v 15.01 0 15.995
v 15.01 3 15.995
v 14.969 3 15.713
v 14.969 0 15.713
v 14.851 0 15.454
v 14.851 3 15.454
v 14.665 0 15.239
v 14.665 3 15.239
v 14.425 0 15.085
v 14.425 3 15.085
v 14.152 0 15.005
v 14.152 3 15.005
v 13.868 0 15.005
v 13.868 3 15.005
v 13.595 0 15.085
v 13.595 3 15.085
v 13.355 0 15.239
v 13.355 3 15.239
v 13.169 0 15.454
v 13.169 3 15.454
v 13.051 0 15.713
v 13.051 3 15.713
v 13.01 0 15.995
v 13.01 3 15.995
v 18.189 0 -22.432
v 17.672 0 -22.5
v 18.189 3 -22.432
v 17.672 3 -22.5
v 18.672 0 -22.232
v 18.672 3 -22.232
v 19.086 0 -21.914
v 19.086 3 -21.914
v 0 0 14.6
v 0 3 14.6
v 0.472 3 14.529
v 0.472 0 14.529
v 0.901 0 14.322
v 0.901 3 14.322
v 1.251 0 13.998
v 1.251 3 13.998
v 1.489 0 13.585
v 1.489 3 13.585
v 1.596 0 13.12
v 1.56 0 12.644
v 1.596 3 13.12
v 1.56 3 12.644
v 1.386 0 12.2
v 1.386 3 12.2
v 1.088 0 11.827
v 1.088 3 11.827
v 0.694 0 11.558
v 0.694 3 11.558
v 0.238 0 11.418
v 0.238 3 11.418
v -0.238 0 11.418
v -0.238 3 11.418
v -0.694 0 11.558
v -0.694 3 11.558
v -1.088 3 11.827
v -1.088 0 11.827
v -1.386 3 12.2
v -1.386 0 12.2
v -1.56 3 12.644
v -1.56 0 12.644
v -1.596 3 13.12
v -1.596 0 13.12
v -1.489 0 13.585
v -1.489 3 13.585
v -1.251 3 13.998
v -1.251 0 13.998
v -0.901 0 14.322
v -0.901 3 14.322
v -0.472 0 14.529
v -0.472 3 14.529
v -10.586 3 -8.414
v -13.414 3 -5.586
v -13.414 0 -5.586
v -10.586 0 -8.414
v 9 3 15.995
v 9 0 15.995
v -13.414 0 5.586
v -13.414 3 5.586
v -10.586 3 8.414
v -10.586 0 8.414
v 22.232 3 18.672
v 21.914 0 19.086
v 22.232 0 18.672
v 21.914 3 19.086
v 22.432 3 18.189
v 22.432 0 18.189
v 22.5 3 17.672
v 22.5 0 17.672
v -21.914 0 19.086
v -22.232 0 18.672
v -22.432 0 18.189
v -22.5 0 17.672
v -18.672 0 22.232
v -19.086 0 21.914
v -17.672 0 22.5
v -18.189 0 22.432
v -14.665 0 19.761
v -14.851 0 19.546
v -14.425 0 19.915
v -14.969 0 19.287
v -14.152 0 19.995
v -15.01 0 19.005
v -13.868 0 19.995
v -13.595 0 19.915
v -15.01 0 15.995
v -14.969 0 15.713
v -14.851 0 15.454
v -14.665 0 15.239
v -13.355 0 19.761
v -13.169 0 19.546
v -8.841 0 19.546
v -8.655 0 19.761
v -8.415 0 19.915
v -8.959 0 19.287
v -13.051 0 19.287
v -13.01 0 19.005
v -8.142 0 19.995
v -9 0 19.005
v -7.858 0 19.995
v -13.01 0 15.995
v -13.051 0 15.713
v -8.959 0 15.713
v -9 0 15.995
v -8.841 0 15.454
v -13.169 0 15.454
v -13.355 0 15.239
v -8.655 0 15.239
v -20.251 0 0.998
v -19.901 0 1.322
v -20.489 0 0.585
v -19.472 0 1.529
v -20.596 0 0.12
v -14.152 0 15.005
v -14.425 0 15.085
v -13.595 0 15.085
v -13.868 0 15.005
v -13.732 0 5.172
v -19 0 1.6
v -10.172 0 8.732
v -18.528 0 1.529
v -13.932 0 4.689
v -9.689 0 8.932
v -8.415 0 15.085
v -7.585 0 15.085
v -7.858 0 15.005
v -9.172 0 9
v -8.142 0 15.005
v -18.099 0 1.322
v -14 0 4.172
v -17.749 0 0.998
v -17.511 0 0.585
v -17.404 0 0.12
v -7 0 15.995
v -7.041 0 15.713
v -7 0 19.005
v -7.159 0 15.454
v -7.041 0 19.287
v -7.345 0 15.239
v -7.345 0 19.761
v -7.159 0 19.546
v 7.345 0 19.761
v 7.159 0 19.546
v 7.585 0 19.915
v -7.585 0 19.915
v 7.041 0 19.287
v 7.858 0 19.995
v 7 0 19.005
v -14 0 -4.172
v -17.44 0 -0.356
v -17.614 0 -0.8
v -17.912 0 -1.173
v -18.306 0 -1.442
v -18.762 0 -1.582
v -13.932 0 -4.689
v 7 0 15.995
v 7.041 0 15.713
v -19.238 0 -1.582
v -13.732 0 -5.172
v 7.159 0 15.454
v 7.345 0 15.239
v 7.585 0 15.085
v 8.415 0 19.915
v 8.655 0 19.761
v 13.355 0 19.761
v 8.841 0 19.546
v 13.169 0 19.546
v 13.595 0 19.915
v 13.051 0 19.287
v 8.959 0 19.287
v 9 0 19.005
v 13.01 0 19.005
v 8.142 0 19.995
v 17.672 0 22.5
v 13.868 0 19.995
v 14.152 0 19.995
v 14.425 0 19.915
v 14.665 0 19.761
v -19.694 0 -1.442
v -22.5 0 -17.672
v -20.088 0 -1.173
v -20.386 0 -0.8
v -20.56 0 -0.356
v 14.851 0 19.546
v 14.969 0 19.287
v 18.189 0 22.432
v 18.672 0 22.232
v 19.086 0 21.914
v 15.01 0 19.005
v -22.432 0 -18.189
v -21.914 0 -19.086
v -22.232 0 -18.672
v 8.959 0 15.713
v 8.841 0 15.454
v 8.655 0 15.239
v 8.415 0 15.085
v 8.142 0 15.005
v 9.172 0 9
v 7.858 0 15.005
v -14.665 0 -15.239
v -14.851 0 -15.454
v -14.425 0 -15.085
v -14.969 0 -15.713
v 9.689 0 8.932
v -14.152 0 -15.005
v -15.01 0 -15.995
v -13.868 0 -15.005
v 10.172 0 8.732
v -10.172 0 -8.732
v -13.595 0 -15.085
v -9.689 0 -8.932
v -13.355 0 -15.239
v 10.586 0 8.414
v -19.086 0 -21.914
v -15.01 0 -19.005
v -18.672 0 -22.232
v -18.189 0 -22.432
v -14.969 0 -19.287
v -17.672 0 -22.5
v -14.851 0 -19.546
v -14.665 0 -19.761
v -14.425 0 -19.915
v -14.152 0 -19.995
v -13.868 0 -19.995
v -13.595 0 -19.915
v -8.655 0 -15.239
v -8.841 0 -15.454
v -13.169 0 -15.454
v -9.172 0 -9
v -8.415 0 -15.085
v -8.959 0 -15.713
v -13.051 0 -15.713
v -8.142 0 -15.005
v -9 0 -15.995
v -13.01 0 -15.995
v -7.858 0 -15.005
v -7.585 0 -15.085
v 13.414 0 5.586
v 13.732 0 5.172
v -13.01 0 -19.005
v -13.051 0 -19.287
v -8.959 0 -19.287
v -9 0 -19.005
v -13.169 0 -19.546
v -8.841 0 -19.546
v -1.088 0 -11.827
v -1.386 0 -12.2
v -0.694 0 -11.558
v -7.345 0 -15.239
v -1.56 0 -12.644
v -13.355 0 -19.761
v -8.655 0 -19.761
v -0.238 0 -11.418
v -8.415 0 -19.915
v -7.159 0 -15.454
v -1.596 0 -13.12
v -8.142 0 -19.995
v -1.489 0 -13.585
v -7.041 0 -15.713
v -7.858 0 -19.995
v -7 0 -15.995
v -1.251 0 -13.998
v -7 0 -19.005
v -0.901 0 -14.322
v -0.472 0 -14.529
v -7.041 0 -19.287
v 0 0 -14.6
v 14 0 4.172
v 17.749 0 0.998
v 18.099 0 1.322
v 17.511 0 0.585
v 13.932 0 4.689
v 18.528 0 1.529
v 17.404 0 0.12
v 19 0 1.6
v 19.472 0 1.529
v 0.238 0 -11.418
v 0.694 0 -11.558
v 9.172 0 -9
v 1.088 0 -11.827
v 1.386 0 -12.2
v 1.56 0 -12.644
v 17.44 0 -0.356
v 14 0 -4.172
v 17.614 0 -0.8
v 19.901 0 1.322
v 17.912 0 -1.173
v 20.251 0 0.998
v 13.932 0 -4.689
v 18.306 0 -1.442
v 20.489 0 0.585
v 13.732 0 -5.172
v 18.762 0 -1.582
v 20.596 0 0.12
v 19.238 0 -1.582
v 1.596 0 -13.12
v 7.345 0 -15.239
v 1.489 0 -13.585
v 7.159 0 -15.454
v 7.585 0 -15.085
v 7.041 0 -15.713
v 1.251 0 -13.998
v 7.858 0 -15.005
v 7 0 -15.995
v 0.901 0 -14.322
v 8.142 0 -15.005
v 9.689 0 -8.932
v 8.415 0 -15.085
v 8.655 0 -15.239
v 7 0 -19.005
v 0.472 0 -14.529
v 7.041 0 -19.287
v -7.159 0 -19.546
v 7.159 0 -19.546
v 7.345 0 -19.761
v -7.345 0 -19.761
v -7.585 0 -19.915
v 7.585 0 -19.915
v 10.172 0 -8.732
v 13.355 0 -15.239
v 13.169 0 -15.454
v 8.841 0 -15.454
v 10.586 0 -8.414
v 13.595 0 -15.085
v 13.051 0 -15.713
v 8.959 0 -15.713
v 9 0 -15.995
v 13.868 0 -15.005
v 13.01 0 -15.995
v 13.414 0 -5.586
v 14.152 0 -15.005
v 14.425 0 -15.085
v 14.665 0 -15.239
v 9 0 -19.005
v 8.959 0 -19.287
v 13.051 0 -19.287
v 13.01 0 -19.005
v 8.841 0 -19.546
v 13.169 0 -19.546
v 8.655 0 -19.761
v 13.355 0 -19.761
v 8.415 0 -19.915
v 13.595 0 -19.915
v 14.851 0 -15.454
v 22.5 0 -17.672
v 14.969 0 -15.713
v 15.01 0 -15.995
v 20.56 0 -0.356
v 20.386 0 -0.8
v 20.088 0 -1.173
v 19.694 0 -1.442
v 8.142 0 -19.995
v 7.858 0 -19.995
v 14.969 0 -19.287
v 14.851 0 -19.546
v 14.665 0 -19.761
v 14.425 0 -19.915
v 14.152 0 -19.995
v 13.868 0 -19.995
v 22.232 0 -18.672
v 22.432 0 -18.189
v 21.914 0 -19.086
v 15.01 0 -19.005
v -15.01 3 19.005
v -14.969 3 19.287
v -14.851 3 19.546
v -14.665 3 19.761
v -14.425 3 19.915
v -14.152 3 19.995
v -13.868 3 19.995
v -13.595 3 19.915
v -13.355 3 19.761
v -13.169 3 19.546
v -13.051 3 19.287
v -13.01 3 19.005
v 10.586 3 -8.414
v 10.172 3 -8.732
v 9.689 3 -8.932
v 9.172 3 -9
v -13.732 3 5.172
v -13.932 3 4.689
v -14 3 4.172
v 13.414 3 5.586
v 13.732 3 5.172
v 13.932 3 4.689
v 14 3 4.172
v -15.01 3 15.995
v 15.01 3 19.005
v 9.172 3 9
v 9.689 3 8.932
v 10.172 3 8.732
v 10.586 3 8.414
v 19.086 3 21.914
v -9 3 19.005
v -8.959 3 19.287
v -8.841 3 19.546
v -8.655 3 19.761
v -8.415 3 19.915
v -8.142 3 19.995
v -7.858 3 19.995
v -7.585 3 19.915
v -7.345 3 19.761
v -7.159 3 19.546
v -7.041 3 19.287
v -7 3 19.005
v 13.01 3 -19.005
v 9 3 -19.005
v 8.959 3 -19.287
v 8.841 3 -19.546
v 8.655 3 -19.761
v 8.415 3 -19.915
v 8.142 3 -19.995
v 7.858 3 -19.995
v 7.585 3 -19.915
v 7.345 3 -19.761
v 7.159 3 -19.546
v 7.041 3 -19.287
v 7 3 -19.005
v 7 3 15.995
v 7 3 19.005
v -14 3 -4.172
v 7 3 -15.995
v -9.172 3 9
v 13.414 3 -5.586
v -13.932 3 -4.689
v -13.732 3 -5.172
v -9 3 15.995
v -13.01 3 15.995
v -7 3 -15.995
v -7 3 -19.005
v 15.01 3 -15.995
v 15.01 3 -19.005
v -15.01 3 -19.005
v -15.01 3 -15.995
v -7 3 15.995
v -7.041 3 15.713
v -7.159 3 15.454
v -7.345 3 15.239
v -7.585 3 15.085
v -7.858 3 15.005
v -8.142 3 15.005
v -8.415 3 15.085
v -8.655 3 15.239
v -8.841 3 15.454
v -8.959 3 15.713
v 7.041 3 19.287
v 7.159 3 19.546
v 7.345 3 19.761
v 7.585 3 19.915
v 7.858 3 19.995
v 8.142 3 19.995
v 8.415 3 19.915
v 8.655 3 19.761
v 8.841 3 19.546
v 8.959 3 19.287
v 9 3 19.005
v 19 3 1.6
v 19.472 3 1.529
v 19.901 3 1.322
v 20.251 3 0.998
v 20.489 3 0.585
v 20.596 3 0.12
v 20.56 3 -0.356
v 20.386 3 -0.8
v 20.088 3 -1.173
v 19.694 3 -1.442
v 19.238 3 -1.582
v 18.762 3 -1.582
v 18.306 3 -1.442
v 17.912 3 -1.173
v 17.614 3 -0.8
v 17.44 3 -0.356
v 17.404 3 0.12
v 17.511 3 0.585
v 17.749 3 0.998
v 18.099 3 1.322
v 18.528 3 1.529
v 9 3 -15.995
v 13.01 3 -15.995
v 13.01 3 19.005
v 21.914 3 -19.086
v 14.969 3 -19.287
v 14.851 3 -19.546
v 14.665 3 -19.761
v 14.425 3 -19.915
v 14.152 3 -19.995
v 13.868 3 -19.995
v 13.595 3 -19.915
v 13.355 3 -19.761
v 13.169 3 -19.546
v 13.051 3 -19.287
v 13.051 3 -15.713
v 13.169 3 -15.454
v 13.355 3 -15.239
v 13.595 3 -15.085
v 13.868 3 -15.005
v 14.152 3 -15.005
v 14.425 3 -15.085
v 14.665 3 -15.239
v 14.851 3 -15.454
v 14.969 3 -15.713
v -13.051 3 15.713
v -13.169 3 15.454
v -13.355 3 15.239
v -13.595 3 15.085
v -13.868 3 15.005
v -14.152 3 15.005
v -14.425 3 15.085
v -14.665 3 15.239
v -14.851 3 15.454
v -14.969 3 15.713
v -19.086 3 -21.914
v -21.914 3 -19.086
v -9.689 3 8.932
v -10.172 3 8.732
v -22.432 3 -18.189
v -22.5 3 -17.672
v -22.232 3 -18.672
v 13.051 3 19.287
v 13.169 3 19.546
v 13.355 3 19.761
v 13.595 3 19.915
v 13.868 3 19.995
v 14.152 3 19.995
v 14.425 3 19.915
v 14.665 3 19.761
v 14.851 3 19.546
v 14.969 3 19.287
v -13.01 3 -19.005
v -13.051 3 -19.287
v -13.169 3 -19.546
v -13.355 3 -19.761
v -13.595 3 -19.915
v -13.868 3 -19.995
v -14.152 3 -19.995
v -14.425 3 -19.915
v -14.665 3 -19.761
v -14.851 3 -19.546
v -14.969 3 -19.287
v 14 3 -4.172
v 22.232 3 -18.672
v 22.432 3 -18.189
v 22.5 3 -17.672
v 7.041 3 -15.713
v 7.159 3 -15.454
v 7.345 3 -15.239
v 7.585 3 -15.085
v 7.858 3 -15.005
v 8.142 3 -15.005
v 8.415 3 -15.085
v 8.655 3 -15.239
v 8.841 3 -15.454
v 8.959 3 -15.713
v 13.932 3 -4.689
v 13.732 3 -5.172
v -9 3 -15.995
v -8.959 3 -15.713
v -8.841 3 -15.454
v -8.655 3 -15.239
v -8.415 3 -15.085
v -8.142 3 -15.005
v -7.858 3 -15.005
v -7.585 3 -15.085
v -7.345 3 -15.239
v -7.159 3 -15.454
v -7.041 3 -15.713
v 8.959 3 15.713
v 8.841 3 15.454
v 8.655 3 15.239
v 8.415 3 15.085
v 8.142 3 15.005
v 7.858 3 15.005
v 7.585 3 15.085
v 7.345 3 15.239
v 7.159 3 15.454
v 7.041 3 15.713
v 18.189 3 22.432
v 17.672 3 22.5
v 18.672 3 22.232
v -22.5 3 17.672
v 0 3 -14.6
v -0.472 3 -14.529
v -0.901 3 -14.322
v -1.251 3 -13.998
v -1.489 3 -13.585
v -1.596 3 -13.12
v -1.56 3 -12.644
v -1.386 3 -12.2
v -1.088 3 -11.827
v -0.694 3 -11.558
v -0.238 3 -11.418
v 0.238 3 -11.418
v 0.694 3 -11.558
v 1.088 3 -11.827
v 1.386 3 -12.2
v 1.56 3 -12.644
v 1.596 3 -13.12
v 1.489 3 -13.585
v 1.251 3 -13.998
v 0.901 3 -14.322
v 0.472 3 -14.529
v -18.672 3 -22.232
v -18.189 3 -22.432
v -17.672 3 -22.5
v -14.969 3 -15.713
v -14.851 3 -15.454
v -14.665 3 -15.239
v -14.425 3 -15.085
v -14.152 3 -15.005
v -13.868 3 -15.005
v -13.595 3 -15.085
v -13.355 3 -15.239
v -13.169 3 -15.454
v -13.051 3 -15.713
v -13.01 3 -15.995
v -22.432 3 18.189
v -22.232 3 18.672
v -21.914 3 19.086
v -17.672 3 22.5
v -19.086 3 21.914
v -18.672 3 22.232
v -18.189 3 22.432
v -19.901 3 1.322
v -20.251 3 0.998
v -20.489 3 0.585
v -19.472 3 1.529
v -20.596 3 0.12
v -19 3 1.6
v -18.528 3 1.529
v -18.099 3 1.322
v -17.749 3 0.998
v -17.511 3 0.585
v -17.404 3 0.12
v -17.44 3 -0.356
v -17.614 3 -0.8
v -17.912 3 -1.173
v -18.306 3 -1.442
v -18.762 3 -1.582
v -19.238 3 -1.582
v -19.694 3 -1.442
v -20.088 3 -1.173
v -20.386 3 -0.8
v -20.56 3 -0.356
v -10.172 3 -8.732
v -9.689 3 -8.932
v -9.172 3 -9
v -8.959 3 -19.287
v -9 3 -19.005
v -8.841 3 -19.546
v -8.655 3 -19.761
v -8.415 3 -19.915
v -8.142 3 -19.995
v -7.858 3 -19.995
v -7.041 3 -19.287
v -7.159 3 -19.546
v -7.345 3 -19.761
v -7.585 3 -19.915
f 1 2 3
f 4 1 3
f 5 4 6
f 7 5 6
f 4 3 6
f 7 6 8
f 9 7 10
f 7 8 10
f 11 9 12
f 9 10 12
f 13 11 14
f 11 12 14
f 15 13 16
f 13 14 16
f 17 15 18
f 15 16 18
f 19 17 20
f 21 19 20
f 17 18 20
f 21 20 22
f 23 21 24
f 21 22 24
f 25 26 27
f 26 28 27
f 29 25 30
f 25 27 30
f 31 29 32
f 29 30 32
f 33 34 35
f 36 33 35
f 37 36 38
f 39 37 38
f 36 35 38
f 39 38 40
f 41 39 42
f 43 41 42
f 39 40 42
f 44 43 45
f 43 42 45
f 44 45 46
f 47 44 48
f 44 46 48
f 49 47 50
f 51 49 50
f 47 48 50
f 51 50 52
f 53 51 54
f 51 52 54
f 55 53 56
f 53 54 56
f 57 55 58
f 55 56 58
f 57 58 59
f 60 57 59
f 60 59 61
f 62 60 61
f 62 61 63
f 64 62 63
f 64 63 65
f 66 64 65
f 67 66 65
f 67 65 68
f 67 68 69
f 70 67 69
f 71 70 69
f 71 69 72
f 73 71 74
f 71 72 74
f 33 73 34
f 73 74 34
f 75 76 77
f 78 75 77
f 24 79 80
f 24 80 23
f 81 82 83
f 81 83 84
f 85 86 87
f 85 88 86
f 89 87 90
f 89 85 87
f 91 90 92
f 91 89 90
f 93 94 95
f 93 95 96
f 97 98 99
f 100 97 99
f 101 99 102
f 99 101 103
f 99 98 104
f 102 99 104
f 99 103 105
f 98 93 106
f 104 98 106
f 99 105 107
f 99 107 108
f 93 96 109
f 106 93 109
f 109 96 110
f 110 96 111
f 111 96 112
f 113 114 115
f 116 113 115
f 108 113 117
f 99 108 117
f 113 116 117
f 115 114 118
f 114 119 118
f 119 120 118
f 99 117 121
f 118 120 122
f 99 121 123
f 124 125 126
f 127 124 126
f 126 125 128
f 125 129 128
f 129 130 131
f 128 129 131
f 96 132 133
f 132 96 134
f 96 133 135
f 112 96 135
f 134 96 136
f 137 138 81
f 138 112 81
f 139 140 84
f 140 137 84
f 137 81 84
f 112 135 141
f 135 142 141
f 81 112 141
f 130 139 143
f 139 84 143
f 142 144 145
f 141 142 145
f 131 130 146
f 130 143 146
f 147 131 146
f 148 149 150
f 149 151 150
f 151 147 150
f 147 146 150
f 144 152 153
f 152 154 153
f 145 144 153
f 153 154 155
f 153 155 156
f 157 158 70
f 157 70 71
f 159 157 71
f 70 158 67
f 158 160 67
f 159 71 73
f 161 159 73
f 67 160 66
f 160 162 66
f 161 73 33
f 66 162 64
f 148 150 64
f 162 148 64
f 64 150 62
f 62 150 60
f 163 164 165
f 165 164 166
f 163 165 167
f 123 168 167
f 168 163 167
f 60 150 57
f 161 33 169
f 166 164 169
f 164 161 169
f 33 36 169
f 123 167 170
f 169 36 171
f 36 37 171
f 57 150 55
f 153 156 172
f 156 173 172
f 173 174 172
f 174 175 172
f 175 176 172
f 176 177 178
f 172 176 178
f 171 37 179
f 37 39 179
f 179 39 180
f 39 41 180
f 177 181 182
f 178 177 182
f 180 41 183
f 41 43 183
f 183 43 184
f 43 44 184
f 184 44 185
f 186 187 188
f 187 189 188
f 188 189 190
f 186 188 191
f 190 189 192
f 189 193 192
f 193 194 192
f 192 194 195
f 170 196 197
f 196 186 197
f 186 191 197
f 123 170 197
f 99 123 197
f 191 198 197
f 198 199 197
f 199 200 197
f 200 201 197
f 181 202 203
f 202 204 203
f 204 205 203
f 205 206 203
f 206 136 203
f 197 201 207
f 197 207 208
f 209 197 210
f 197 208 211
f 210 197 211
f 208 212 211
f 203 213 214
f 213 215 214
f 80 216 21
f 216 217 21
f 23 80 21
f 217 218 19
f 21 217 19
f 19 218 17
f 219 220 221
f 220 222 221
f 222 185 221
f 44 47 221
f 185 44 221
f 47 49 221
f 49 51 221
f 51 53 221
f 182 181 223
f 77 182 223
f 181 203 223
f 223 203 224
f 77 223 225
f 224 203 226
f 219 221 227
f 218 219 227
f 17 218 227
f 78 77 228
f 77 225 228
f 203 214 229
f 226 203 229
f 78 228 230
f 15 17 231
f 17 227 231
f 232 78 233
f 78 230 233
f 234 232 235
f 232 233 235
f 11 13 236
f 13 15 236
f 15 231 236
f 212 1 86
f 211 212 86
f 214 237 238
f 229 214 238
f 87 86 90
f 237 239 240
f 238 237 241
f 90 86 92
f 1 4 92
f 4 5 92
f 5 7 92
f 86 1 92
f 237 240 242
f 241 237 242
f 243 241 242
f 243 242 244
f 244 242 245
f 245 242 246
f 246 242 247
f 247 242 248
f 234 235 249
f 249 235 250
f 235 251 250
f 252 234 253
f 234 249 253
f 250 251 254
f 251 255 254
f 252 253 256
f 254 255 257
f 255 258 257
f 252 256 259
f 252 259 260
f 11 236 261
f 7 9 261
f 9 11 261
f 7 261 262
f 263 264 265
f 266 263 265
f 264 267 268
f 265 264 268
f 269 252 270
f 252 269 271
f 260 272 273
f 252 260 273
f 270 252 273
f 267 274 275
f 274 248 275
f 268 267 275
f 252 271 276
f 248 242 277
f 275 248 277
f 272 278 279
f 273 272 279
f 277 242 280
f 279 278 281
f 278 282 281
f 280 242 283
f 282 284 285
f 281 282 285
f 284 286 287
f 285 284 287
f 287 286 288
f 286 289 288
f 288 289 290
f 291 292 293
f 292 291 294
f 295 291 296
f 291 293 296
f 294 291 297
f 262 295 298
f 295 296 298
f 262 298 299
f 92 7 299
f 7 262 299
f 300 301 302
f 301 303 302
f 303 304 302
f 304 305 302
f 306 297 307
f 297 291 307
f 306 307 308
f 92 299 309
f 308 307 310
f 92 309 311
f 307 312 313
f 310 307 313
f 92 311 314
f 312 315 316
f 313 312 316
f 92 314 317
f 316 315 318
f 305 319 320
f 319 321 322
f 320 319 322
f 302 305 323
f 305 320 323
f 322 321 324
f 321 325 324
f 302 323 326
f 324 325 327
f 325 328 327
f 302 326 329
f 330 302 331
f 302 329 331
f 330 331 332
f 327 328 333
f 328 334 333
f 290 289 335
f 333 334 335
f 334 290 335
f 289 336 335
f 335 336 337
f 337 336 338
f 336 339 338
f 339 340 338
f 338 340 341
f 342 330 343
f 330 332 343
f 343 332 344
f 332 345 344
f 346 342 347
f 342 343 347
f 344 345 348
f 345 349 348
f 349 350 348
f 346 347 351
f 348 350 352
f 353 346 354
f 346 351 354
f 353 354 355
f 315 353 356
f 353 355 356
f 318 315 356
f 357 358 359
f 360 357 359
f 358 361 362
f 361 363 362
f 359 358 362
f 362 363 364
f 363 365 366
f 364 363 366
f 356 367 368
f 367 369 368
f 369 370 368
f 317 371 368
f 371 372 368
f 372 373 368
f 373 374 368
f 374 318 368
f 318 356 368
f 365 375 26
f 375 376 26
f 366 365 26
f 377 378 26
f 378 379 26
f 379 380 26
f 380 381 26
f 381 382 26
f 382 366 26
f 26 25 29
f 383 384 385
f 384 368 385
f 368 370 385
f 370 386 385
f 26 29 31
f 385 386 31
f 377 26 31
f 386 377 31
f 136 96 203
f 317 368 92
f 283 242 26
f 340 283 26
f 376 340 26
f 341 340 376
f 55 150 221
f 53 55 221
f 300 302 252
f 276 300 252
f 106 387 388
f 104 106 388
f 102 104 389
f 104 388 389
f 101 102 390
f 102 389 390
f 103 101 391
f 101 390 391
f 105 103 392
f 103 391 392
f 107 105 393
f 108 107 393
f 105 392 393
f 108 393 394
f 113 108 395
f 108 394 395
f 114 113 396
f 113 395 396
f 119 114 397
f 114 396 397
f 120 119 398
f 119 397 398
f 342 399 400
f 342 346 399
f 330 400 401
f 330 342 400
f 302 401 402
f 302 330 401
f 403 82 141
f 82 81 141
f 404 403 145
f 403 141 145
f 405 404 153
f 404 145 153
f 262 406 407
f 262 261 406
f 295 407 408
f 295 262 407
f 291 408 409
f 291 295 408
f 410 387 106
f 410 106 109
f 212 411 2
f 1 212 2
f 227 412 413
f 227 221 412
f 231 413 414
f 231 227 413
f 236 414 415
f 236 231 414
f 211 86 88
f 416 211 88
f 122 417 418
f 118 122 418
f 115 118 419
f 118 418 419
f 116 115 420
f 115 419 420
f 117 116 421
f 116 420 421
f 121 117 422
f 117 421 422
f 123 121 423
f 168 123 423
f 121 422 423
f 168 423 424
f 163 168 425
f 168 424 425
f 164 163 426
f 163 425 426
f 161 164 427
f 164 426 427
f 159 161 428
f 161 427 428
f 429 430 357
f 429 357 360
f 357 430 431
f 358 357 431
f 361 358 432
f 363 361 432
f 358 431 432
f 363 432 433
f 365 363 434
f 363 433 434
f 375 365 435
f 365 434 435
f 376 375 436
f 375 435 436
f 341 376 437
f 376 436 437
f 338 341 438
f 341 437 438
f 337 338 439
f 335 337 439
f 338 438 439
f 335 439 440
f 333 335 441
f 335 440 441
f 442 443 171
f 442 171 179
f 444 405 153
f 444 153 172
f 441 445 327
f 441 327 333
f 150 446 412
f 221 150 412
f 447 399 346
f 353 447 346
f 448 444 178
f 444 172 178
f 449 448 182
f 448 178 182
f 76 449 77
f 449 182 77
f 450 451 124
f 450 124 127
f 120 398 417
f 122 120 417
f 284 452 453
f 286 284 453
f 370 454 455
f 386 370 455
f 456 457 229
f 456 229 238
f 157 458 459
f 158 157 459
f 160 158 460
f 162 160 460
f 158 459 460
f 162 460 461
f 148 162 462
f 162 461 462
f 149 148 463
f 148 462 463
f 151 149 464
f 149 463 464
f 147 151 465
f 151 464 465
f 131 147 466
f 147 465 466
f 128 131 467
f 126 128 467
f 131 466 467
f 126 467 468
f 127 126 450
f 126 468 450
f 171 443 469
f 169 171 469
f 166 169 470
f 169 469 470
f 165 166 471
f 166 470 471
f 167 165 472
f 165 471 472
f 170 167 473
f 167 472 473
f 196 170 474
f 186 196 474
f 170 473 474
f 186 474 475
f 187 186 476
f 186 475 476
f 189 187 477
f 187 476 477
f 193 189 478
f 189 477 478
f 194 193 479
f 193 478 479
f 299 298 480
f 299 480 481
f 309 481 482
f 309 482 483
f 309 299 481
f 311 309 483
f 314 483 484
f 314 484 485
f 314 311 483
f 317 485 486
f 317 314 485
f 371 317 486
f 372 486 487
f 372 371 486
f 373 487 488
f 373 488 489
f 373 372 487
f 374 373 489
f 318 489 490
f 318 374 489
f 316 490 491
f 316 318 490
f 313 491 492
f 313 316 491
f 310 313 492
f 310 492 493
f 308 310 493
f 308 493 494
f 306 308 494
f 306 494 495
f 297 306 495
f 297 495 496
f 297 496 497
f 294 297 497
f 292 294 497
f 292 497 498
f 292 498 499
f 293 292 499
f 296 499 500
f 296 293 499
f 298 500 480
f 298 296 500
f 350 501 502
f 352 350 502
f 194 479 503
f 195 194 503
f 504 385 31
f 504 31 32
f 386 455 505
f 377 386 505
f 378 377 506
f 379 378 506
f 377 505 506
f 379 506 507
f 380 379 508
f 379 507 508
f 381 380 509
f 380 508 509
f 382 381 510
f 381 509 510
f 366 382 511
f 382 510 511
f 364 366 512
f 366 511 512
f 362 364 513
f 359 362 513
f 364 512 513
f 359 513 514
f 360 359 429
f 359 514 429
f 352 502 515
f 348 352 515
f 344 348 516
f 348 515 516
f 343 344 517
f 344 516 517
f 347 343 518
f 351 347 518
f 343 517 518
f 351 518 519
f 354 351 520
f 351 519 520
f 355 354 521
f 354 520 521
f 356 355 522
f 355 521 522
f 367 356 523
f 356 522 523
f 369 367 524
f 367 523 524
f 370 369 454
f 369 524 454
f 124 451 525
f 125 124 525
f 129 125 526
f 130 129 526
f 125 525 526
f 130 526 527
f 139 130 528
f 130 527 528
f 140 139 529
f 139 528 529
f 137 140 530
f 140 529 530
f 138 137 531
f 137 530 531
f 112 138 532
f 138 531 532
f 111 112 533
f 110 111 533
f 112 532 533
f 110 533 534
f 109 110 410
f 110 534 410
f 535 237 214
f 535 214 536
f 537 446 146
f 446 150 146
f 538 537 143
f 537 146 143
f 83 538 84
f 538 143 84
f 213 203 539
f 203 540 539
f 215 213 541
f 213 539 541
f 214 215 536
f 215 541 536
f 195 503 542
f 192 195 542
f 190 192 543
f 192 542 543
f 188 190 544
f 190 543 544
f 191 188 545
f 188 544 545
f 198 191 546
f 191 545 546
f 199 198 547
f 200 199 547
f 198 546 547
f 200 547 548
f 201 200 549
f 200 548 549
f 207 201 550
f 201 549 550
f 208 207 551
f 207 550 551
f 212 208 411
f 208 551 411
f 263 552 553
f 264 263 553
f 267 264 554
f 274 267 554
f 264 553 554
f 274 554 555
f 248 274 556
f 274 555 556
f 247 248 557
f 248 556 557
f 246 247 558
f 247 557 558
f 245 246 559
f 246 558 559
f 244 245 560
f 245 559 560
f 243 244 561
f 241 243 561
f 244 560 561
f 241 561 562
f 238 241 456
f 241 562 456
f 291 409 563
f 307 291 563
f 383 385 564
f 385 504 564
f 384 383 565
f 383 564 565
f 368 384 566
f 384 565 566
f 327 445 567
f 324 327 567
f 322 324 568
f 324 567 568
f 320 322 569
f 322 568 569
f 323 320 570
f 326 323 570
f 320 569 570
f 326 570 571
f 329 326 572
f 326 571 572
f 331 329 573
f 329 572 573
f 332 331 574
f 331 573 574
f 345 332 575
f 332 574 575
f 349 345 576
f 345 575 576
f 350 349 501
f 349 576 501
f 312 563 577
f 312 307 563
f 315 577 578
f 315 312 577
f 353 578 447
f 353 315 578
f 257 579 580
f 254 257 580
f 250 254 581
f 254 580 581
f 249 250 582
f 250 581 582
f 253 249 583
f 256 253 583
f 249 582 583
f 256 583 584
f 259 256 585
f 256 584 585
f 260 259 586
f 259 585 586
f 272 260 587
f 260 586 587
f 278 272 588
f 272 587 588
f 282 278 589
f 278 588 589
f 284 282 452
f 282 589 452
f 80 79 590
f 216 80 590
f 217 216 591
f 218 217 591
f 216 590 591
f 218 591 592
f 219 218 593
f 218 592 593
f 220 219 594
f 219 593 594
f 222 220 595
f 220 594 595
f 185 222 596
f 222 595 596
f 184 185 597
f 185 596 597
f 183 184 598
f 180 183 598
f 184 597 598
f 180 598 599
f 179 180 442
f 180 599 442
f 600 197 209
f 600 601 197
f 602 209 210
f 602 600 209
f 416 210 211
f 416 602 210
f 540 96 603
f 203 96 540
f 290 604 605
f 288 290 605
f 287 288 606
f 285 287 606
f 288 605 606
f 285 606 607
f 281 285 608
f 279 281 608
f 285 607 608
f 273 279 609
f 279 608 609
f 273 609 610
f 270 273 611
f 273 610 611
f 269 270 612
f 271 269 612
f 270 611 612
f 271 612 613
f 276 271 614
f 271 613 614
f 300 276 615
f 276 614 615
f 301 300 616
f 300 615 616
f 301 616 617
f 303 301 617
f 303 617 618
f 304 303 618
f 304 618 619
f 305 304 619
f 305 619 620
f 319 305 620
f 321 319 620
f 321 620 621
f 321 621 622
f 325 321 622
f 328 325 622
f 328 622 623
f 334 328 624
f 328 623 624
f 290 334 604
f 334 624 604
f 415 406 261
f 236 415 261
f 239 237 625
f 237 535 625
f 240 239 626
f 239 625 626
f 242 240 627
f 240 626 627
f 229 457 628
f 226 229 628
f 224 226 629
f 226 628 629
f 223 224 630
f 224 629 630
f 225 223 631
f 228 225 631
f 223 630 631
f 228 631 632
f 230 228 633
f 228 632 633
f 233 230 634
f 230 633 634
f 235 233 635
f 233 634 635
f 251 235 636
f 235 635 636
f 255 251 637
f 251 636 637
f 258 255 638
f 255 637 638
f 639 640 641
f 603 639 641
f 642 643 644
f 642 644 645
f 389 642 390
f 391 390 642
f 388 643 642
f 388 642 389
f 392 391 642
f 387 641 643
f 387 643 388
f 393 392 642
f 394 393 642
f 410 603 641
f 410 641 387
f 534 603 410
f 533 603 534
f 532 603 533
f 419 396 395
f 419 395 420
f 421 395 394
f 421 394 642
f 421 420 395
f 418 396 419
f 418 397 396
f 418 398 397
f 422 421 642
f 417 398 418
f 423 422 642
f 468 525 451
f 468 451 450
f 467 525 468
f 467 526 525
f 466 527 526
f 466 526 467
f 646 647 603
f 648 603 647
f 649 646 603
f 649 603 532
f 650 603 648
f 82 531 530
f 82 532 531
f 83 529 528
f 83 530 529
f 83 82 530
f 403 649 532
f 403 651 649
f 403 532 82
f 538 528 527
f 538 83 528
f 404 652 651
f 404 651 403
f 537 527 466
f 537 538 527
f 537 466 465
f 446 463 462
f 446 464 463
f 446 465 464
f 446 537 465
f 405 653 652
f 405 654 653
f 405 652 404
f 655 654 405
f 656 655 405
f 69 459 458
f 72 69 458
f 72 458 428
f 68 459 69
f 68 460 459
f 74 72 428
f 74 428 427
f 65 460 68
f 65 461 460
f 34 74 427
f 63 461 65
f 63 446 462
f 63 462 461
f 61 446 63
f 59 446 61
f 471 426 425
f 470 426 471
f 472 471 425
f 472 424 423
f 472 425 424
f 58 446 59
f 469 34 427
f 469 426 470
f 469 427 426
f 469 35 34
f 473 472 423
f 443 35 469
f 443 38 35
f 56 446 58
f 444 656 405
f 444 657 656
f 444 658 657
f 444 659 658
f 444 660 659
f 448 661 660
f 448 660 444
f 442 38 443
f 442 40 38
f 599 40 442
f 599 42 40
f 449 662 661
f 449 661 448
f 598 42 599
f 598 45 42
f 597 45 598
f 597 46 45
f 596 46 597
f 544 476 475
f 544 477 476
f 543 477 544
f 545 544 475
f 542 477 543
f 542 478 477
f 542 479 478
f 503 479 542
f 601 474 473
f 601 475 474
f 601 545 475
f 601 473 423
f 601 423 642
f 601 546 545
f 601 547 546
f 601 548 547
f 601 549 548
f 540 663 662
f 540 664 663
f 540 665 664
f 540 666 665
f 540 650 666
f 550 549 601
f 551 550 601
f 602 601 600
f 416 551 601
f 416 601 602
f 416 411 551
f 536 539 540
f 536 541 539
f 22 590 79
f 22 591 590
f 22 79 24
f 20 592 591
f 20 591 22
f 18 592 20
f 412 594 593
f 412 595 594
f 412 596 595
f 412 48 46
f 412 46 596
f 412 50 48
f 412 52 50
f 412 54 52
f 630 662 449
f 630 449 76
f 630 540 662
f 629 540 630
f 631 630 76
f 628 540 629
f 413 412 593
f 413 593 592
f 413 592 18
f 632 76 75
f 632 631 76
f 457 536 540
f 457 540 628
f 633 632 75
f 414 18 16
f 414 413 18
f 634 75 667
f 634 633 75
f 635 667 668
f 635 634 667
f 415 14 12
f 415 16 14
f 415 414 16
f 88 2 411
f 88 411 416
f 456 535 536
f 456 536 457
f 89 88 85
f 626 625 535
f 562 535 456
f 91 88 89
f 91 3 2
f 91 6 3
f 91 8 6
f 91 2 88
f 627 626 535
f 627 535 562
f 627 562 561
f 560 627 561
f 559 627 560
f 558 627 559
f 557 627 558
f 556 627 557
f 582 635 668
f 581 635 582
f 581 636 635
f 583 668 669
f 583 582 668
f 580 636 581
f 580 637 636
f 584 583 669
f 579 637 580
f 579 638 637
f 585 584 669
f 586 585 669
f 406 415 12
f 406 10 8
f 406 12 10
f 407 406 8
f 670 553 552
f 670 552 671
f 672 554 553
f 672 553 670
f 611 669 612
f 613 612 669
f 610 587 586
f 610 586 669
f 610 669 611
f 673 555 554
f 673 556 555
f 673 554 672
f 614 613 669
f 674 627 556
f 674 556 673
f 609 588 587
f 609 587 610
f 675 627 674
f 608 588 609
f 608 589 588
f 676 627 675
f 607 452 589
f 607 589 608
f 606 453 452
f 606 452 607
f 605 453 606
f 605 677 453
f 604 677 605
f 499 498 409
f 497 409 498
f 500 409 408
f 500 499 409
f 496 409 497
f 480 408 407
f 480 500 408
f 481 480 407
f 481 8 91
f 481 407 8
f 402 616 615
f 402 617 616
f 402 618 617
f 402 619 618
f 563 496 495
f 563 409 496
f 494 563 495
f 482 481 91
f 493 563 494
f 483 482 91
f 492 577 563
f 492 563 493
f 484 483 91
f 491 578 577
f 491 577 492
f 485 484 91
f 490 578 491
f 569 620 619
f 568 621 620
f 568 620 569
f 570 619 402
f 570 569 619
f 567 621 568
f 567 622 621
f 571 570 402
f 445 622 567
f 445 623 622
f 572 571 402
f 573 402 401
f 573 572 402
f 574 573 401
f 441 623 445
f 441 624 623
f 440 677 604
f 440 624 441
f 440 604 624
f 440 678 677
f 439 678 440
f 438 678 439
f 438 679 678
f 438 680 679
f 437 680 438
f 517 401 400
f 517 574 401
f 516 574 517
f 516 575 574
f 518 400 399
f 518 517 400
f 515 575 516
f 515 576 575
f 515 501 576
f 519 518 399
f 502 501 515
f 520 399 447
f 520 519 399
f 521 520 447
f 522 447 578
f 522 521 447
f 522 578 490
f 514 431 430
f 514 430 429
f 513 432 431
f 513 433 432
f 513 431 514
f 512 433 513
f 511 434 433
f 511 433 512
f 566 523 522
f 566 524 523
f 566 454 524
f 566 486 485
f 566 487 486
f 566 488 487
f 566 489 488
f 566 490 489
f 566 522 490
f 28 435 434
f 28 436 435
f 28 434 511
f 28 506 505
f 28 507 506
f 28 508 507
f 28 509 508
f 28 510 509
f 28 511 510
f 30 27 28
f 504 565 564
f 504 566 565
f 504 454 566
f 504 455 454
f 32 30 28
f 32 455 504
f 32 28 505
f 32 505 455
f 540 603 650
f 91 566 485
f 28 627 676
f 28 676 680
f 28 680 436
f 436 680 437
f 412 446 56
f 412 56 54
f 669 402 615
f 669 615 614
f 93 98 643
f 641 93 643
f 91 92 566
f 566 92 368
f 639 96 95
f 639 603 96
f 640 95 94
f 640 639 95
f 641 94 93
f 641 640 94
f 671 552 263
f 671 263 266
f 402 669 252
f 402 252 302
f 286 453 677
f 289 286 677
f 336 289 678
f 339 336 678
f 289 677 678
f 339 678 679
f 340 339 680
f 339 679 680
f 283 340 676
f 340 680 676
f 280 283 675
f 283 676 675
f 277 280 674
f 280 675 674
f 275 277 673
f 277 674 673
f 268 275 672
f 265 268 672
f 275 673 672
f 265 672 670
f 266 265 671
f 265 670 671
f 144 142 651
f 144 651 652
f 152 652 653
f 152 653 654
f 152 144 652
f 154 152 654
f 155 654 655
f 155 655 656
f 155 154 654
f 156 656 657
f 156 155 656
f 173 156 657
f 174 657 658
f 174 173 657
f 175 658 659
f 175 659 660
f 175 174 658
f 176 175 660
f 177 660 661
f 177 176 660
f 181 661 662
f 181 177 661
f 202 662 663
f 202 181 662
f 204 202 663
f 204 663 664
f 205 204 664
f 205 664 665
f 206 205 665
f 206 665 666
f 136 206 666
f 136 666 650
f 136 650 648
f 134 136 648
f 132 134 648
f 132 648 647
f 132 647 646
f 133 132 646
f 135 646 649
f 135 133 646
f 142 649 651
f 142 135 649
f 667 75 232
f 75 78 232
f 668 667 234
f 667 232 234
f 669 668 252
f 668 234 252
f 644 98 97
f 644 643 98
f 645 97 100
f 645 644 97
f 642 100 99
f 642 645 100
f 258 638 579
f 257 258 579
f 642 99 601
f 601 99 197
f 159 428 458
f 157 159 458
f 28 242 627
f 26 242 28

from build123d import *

# Parameters (mm, degrees)
SKETCH_1_W          = 45
SKETCH_1_H          = 45
SKETCH_1_R          = 1.6
EXTRUDE_1_DEPTH     = 3
SKETCH_2_W          = 8.01
SKETCH_2_H          = 3.01
CUT_EXTRUDE_1_DEPTH = 3
SKETCH_4_R          = 1
SKETCH_4_R_2        = 1.6
CUT_EXTRUDE_2_DEPTH = 3
SKETCH_5_W          = 28
SKETCH_5_H          = 18
CUT_EXTRUDE_3_DEPTH = 3
CHAMFER_1_SIZE      = 4
FILLET_1_R          = 2


with BuildPart() as part:
    # 草图1 → 凸台-拉伸1 (new body)
    with BuildSketch(Plane(origin=(0, 0, 0), x_dir=(1, 0, 0), z_dir=(0, 1, 0))):
        Rectangle(SKETCH_1_W, SKETCH_1_H)
        with Locations(Location((19, 0, 0), (0, 0, 270))):
            Circle(SKETCH_1_R, mode=Mode.SUBTRACT)
        with Locations(Location((-19, 0, 0), (0, 0, 270))):
            Circle(SKETCH_1_R, mode=Mode.SUBTRACT)
    extrude(amount=EXTRUDE_1_DEPTH)

    # 草图2 → 切除-拉伸1 (cut)
    with BuildSketch(Plane(origin=(0, 3, 0), x_dir=(1, 0, 0), z_dir=(0, 1, 0))):
        with Locations((-11.005, -17.5)):
            Rectangle(SKETCH_2_W, SKETCH_2_H)
        with Locations((11.005, -17.5)):
            Rectangle(SKETCH_2_W, SKETCH_2_H)
        with Locations((-11.005, 17.5)):
            Rectangle(SKETCH_2_W, SKETCH_2_H)
        with Locations((11.005, 17.5)):
            Rectangle(SKETCH_2_W, SKETCH_2_H)
    extrude(amount=-CUT_EXTRUDE_1_DEPTH, mode=Mode.SUBTRACT)

    # 草图4 → 切除-拉伸2 (cut)
    with BuildSketch(Plane(origin=(0, 3, 0), x_dir=(1, 0, 0), z_dir=(0, 1, 0))):
        with Locations((-14.01, -15.995)):
            Circle(SKETCH_4_R)
        with Locations((-14.01, -19.005)):
            Circle(SKETCH_4_R)
        with Locations((-8, -15.995)):
            Circle(SKETCH_4_R)
        with Locations((-8, -19.005)):
            Circle(SKETCH_4_R)
        with Locations((8, -19.005)):
            Circle(SKETCH_4_R)
        with Locations((8, -15.995)):
            Circle(SKETCH_4_R)
        with Locations((14.01, -19.005)):
            Circle(SKETCH_4_R)
        with Locations((14.01, -15.995)):
            Circle(SKETCH_4_R)
        with Locations((-8, 19.005)):
            Circle(SKETCH_4_R)
        with Locations((-8, 15.995)):
            Circle(SKETCH_4_R)
        with Locations((-14.01, 19.005)):
            Circle(SKETCH_4_R)
        with Locations((-14.01, 15.995)):
            Circle(SKETCH_4_R)
        with Locations((14.01, 15.995)):
            Circle(SKETCH_4_R)
        with Locations((14.01, 19.005)):
            Circle(SKETCH_4_R)
        with Locations((8, 15.995)):
            Circle(SKETCH_4_R)
        with Locations((8, 19.005)):
            Circle(SKETCH_4_R)
        with Locations(Location((0, -13, 0), (0, 0, 270))):
            Circle(SKETCH_4_R_2)
        with Locations(Location((0, 13, 0), (0, 0, 90))):
            Circle(SKETCH_4_R_2)
    extrude(amount=-CUT_EXTRUDE_2_DEPTH, mode=Mode.SUBTRACT)

    # 草图5 → 切除-拉伸3 (cut)
    with BuildSketch(Plane(origin=(0, 3, 0), x_dir=(1, 0, 0), z_dir=(0, 1, 0))):
        Rectangle(SKETCH_5_W, SKETCH_5_H)
    extrude(amount=-CUT_EXTRUDE_3_DEPTH, mode=Mode.SUBTRACT)

    # 倒角1
    chamfer_1_edges = [part.edges().sort_by_distance(p)[0] for p in [
        (14, 1.5, -9),
        (14, 1.5, 9),
        (-14, 1.5, 9),
        (-14, 1.5, -9),
        (22.5, 1.5, 22.5),
        (-22.5, 1.5, 22.5),
        (-22.5, 1.5, -22.5),
        (22.5, 1.5, -22.5),
    ]]
    chamfer(chamfer_1_edges, length=CHAMFER_1_SIZE)

    # 圆角1
    fillet_1_edges = [part.edges().sort_by_distance(p)[0] for p in [
        (-22.5, 1.5, 18.5),
        (-22.5, 1.5, -18.5),
        (18.5, 1.5, -22.5),
        (-18.5, 1.5, -22.5),
        (22.5, 1.5, 18.5),
        (22.5, 1.5, -18.5),
        (-18.5, 1.5, 22.5),
        (18.5, 1.5, 22.5),
        (10, 1.5, 9),
        (-10, 1.5, 9),
        (-14, 1.5, -5),
        (-14, 1.5, 5),
        (14, 1.5, -5),
        (14, 1.5, 5),
        (-10, 1.5, -9),
        (10, 1.5, -9),
    ]]
    fillet(fillet_1_edges, radius=FILLET_1_R)


solid = part.part
